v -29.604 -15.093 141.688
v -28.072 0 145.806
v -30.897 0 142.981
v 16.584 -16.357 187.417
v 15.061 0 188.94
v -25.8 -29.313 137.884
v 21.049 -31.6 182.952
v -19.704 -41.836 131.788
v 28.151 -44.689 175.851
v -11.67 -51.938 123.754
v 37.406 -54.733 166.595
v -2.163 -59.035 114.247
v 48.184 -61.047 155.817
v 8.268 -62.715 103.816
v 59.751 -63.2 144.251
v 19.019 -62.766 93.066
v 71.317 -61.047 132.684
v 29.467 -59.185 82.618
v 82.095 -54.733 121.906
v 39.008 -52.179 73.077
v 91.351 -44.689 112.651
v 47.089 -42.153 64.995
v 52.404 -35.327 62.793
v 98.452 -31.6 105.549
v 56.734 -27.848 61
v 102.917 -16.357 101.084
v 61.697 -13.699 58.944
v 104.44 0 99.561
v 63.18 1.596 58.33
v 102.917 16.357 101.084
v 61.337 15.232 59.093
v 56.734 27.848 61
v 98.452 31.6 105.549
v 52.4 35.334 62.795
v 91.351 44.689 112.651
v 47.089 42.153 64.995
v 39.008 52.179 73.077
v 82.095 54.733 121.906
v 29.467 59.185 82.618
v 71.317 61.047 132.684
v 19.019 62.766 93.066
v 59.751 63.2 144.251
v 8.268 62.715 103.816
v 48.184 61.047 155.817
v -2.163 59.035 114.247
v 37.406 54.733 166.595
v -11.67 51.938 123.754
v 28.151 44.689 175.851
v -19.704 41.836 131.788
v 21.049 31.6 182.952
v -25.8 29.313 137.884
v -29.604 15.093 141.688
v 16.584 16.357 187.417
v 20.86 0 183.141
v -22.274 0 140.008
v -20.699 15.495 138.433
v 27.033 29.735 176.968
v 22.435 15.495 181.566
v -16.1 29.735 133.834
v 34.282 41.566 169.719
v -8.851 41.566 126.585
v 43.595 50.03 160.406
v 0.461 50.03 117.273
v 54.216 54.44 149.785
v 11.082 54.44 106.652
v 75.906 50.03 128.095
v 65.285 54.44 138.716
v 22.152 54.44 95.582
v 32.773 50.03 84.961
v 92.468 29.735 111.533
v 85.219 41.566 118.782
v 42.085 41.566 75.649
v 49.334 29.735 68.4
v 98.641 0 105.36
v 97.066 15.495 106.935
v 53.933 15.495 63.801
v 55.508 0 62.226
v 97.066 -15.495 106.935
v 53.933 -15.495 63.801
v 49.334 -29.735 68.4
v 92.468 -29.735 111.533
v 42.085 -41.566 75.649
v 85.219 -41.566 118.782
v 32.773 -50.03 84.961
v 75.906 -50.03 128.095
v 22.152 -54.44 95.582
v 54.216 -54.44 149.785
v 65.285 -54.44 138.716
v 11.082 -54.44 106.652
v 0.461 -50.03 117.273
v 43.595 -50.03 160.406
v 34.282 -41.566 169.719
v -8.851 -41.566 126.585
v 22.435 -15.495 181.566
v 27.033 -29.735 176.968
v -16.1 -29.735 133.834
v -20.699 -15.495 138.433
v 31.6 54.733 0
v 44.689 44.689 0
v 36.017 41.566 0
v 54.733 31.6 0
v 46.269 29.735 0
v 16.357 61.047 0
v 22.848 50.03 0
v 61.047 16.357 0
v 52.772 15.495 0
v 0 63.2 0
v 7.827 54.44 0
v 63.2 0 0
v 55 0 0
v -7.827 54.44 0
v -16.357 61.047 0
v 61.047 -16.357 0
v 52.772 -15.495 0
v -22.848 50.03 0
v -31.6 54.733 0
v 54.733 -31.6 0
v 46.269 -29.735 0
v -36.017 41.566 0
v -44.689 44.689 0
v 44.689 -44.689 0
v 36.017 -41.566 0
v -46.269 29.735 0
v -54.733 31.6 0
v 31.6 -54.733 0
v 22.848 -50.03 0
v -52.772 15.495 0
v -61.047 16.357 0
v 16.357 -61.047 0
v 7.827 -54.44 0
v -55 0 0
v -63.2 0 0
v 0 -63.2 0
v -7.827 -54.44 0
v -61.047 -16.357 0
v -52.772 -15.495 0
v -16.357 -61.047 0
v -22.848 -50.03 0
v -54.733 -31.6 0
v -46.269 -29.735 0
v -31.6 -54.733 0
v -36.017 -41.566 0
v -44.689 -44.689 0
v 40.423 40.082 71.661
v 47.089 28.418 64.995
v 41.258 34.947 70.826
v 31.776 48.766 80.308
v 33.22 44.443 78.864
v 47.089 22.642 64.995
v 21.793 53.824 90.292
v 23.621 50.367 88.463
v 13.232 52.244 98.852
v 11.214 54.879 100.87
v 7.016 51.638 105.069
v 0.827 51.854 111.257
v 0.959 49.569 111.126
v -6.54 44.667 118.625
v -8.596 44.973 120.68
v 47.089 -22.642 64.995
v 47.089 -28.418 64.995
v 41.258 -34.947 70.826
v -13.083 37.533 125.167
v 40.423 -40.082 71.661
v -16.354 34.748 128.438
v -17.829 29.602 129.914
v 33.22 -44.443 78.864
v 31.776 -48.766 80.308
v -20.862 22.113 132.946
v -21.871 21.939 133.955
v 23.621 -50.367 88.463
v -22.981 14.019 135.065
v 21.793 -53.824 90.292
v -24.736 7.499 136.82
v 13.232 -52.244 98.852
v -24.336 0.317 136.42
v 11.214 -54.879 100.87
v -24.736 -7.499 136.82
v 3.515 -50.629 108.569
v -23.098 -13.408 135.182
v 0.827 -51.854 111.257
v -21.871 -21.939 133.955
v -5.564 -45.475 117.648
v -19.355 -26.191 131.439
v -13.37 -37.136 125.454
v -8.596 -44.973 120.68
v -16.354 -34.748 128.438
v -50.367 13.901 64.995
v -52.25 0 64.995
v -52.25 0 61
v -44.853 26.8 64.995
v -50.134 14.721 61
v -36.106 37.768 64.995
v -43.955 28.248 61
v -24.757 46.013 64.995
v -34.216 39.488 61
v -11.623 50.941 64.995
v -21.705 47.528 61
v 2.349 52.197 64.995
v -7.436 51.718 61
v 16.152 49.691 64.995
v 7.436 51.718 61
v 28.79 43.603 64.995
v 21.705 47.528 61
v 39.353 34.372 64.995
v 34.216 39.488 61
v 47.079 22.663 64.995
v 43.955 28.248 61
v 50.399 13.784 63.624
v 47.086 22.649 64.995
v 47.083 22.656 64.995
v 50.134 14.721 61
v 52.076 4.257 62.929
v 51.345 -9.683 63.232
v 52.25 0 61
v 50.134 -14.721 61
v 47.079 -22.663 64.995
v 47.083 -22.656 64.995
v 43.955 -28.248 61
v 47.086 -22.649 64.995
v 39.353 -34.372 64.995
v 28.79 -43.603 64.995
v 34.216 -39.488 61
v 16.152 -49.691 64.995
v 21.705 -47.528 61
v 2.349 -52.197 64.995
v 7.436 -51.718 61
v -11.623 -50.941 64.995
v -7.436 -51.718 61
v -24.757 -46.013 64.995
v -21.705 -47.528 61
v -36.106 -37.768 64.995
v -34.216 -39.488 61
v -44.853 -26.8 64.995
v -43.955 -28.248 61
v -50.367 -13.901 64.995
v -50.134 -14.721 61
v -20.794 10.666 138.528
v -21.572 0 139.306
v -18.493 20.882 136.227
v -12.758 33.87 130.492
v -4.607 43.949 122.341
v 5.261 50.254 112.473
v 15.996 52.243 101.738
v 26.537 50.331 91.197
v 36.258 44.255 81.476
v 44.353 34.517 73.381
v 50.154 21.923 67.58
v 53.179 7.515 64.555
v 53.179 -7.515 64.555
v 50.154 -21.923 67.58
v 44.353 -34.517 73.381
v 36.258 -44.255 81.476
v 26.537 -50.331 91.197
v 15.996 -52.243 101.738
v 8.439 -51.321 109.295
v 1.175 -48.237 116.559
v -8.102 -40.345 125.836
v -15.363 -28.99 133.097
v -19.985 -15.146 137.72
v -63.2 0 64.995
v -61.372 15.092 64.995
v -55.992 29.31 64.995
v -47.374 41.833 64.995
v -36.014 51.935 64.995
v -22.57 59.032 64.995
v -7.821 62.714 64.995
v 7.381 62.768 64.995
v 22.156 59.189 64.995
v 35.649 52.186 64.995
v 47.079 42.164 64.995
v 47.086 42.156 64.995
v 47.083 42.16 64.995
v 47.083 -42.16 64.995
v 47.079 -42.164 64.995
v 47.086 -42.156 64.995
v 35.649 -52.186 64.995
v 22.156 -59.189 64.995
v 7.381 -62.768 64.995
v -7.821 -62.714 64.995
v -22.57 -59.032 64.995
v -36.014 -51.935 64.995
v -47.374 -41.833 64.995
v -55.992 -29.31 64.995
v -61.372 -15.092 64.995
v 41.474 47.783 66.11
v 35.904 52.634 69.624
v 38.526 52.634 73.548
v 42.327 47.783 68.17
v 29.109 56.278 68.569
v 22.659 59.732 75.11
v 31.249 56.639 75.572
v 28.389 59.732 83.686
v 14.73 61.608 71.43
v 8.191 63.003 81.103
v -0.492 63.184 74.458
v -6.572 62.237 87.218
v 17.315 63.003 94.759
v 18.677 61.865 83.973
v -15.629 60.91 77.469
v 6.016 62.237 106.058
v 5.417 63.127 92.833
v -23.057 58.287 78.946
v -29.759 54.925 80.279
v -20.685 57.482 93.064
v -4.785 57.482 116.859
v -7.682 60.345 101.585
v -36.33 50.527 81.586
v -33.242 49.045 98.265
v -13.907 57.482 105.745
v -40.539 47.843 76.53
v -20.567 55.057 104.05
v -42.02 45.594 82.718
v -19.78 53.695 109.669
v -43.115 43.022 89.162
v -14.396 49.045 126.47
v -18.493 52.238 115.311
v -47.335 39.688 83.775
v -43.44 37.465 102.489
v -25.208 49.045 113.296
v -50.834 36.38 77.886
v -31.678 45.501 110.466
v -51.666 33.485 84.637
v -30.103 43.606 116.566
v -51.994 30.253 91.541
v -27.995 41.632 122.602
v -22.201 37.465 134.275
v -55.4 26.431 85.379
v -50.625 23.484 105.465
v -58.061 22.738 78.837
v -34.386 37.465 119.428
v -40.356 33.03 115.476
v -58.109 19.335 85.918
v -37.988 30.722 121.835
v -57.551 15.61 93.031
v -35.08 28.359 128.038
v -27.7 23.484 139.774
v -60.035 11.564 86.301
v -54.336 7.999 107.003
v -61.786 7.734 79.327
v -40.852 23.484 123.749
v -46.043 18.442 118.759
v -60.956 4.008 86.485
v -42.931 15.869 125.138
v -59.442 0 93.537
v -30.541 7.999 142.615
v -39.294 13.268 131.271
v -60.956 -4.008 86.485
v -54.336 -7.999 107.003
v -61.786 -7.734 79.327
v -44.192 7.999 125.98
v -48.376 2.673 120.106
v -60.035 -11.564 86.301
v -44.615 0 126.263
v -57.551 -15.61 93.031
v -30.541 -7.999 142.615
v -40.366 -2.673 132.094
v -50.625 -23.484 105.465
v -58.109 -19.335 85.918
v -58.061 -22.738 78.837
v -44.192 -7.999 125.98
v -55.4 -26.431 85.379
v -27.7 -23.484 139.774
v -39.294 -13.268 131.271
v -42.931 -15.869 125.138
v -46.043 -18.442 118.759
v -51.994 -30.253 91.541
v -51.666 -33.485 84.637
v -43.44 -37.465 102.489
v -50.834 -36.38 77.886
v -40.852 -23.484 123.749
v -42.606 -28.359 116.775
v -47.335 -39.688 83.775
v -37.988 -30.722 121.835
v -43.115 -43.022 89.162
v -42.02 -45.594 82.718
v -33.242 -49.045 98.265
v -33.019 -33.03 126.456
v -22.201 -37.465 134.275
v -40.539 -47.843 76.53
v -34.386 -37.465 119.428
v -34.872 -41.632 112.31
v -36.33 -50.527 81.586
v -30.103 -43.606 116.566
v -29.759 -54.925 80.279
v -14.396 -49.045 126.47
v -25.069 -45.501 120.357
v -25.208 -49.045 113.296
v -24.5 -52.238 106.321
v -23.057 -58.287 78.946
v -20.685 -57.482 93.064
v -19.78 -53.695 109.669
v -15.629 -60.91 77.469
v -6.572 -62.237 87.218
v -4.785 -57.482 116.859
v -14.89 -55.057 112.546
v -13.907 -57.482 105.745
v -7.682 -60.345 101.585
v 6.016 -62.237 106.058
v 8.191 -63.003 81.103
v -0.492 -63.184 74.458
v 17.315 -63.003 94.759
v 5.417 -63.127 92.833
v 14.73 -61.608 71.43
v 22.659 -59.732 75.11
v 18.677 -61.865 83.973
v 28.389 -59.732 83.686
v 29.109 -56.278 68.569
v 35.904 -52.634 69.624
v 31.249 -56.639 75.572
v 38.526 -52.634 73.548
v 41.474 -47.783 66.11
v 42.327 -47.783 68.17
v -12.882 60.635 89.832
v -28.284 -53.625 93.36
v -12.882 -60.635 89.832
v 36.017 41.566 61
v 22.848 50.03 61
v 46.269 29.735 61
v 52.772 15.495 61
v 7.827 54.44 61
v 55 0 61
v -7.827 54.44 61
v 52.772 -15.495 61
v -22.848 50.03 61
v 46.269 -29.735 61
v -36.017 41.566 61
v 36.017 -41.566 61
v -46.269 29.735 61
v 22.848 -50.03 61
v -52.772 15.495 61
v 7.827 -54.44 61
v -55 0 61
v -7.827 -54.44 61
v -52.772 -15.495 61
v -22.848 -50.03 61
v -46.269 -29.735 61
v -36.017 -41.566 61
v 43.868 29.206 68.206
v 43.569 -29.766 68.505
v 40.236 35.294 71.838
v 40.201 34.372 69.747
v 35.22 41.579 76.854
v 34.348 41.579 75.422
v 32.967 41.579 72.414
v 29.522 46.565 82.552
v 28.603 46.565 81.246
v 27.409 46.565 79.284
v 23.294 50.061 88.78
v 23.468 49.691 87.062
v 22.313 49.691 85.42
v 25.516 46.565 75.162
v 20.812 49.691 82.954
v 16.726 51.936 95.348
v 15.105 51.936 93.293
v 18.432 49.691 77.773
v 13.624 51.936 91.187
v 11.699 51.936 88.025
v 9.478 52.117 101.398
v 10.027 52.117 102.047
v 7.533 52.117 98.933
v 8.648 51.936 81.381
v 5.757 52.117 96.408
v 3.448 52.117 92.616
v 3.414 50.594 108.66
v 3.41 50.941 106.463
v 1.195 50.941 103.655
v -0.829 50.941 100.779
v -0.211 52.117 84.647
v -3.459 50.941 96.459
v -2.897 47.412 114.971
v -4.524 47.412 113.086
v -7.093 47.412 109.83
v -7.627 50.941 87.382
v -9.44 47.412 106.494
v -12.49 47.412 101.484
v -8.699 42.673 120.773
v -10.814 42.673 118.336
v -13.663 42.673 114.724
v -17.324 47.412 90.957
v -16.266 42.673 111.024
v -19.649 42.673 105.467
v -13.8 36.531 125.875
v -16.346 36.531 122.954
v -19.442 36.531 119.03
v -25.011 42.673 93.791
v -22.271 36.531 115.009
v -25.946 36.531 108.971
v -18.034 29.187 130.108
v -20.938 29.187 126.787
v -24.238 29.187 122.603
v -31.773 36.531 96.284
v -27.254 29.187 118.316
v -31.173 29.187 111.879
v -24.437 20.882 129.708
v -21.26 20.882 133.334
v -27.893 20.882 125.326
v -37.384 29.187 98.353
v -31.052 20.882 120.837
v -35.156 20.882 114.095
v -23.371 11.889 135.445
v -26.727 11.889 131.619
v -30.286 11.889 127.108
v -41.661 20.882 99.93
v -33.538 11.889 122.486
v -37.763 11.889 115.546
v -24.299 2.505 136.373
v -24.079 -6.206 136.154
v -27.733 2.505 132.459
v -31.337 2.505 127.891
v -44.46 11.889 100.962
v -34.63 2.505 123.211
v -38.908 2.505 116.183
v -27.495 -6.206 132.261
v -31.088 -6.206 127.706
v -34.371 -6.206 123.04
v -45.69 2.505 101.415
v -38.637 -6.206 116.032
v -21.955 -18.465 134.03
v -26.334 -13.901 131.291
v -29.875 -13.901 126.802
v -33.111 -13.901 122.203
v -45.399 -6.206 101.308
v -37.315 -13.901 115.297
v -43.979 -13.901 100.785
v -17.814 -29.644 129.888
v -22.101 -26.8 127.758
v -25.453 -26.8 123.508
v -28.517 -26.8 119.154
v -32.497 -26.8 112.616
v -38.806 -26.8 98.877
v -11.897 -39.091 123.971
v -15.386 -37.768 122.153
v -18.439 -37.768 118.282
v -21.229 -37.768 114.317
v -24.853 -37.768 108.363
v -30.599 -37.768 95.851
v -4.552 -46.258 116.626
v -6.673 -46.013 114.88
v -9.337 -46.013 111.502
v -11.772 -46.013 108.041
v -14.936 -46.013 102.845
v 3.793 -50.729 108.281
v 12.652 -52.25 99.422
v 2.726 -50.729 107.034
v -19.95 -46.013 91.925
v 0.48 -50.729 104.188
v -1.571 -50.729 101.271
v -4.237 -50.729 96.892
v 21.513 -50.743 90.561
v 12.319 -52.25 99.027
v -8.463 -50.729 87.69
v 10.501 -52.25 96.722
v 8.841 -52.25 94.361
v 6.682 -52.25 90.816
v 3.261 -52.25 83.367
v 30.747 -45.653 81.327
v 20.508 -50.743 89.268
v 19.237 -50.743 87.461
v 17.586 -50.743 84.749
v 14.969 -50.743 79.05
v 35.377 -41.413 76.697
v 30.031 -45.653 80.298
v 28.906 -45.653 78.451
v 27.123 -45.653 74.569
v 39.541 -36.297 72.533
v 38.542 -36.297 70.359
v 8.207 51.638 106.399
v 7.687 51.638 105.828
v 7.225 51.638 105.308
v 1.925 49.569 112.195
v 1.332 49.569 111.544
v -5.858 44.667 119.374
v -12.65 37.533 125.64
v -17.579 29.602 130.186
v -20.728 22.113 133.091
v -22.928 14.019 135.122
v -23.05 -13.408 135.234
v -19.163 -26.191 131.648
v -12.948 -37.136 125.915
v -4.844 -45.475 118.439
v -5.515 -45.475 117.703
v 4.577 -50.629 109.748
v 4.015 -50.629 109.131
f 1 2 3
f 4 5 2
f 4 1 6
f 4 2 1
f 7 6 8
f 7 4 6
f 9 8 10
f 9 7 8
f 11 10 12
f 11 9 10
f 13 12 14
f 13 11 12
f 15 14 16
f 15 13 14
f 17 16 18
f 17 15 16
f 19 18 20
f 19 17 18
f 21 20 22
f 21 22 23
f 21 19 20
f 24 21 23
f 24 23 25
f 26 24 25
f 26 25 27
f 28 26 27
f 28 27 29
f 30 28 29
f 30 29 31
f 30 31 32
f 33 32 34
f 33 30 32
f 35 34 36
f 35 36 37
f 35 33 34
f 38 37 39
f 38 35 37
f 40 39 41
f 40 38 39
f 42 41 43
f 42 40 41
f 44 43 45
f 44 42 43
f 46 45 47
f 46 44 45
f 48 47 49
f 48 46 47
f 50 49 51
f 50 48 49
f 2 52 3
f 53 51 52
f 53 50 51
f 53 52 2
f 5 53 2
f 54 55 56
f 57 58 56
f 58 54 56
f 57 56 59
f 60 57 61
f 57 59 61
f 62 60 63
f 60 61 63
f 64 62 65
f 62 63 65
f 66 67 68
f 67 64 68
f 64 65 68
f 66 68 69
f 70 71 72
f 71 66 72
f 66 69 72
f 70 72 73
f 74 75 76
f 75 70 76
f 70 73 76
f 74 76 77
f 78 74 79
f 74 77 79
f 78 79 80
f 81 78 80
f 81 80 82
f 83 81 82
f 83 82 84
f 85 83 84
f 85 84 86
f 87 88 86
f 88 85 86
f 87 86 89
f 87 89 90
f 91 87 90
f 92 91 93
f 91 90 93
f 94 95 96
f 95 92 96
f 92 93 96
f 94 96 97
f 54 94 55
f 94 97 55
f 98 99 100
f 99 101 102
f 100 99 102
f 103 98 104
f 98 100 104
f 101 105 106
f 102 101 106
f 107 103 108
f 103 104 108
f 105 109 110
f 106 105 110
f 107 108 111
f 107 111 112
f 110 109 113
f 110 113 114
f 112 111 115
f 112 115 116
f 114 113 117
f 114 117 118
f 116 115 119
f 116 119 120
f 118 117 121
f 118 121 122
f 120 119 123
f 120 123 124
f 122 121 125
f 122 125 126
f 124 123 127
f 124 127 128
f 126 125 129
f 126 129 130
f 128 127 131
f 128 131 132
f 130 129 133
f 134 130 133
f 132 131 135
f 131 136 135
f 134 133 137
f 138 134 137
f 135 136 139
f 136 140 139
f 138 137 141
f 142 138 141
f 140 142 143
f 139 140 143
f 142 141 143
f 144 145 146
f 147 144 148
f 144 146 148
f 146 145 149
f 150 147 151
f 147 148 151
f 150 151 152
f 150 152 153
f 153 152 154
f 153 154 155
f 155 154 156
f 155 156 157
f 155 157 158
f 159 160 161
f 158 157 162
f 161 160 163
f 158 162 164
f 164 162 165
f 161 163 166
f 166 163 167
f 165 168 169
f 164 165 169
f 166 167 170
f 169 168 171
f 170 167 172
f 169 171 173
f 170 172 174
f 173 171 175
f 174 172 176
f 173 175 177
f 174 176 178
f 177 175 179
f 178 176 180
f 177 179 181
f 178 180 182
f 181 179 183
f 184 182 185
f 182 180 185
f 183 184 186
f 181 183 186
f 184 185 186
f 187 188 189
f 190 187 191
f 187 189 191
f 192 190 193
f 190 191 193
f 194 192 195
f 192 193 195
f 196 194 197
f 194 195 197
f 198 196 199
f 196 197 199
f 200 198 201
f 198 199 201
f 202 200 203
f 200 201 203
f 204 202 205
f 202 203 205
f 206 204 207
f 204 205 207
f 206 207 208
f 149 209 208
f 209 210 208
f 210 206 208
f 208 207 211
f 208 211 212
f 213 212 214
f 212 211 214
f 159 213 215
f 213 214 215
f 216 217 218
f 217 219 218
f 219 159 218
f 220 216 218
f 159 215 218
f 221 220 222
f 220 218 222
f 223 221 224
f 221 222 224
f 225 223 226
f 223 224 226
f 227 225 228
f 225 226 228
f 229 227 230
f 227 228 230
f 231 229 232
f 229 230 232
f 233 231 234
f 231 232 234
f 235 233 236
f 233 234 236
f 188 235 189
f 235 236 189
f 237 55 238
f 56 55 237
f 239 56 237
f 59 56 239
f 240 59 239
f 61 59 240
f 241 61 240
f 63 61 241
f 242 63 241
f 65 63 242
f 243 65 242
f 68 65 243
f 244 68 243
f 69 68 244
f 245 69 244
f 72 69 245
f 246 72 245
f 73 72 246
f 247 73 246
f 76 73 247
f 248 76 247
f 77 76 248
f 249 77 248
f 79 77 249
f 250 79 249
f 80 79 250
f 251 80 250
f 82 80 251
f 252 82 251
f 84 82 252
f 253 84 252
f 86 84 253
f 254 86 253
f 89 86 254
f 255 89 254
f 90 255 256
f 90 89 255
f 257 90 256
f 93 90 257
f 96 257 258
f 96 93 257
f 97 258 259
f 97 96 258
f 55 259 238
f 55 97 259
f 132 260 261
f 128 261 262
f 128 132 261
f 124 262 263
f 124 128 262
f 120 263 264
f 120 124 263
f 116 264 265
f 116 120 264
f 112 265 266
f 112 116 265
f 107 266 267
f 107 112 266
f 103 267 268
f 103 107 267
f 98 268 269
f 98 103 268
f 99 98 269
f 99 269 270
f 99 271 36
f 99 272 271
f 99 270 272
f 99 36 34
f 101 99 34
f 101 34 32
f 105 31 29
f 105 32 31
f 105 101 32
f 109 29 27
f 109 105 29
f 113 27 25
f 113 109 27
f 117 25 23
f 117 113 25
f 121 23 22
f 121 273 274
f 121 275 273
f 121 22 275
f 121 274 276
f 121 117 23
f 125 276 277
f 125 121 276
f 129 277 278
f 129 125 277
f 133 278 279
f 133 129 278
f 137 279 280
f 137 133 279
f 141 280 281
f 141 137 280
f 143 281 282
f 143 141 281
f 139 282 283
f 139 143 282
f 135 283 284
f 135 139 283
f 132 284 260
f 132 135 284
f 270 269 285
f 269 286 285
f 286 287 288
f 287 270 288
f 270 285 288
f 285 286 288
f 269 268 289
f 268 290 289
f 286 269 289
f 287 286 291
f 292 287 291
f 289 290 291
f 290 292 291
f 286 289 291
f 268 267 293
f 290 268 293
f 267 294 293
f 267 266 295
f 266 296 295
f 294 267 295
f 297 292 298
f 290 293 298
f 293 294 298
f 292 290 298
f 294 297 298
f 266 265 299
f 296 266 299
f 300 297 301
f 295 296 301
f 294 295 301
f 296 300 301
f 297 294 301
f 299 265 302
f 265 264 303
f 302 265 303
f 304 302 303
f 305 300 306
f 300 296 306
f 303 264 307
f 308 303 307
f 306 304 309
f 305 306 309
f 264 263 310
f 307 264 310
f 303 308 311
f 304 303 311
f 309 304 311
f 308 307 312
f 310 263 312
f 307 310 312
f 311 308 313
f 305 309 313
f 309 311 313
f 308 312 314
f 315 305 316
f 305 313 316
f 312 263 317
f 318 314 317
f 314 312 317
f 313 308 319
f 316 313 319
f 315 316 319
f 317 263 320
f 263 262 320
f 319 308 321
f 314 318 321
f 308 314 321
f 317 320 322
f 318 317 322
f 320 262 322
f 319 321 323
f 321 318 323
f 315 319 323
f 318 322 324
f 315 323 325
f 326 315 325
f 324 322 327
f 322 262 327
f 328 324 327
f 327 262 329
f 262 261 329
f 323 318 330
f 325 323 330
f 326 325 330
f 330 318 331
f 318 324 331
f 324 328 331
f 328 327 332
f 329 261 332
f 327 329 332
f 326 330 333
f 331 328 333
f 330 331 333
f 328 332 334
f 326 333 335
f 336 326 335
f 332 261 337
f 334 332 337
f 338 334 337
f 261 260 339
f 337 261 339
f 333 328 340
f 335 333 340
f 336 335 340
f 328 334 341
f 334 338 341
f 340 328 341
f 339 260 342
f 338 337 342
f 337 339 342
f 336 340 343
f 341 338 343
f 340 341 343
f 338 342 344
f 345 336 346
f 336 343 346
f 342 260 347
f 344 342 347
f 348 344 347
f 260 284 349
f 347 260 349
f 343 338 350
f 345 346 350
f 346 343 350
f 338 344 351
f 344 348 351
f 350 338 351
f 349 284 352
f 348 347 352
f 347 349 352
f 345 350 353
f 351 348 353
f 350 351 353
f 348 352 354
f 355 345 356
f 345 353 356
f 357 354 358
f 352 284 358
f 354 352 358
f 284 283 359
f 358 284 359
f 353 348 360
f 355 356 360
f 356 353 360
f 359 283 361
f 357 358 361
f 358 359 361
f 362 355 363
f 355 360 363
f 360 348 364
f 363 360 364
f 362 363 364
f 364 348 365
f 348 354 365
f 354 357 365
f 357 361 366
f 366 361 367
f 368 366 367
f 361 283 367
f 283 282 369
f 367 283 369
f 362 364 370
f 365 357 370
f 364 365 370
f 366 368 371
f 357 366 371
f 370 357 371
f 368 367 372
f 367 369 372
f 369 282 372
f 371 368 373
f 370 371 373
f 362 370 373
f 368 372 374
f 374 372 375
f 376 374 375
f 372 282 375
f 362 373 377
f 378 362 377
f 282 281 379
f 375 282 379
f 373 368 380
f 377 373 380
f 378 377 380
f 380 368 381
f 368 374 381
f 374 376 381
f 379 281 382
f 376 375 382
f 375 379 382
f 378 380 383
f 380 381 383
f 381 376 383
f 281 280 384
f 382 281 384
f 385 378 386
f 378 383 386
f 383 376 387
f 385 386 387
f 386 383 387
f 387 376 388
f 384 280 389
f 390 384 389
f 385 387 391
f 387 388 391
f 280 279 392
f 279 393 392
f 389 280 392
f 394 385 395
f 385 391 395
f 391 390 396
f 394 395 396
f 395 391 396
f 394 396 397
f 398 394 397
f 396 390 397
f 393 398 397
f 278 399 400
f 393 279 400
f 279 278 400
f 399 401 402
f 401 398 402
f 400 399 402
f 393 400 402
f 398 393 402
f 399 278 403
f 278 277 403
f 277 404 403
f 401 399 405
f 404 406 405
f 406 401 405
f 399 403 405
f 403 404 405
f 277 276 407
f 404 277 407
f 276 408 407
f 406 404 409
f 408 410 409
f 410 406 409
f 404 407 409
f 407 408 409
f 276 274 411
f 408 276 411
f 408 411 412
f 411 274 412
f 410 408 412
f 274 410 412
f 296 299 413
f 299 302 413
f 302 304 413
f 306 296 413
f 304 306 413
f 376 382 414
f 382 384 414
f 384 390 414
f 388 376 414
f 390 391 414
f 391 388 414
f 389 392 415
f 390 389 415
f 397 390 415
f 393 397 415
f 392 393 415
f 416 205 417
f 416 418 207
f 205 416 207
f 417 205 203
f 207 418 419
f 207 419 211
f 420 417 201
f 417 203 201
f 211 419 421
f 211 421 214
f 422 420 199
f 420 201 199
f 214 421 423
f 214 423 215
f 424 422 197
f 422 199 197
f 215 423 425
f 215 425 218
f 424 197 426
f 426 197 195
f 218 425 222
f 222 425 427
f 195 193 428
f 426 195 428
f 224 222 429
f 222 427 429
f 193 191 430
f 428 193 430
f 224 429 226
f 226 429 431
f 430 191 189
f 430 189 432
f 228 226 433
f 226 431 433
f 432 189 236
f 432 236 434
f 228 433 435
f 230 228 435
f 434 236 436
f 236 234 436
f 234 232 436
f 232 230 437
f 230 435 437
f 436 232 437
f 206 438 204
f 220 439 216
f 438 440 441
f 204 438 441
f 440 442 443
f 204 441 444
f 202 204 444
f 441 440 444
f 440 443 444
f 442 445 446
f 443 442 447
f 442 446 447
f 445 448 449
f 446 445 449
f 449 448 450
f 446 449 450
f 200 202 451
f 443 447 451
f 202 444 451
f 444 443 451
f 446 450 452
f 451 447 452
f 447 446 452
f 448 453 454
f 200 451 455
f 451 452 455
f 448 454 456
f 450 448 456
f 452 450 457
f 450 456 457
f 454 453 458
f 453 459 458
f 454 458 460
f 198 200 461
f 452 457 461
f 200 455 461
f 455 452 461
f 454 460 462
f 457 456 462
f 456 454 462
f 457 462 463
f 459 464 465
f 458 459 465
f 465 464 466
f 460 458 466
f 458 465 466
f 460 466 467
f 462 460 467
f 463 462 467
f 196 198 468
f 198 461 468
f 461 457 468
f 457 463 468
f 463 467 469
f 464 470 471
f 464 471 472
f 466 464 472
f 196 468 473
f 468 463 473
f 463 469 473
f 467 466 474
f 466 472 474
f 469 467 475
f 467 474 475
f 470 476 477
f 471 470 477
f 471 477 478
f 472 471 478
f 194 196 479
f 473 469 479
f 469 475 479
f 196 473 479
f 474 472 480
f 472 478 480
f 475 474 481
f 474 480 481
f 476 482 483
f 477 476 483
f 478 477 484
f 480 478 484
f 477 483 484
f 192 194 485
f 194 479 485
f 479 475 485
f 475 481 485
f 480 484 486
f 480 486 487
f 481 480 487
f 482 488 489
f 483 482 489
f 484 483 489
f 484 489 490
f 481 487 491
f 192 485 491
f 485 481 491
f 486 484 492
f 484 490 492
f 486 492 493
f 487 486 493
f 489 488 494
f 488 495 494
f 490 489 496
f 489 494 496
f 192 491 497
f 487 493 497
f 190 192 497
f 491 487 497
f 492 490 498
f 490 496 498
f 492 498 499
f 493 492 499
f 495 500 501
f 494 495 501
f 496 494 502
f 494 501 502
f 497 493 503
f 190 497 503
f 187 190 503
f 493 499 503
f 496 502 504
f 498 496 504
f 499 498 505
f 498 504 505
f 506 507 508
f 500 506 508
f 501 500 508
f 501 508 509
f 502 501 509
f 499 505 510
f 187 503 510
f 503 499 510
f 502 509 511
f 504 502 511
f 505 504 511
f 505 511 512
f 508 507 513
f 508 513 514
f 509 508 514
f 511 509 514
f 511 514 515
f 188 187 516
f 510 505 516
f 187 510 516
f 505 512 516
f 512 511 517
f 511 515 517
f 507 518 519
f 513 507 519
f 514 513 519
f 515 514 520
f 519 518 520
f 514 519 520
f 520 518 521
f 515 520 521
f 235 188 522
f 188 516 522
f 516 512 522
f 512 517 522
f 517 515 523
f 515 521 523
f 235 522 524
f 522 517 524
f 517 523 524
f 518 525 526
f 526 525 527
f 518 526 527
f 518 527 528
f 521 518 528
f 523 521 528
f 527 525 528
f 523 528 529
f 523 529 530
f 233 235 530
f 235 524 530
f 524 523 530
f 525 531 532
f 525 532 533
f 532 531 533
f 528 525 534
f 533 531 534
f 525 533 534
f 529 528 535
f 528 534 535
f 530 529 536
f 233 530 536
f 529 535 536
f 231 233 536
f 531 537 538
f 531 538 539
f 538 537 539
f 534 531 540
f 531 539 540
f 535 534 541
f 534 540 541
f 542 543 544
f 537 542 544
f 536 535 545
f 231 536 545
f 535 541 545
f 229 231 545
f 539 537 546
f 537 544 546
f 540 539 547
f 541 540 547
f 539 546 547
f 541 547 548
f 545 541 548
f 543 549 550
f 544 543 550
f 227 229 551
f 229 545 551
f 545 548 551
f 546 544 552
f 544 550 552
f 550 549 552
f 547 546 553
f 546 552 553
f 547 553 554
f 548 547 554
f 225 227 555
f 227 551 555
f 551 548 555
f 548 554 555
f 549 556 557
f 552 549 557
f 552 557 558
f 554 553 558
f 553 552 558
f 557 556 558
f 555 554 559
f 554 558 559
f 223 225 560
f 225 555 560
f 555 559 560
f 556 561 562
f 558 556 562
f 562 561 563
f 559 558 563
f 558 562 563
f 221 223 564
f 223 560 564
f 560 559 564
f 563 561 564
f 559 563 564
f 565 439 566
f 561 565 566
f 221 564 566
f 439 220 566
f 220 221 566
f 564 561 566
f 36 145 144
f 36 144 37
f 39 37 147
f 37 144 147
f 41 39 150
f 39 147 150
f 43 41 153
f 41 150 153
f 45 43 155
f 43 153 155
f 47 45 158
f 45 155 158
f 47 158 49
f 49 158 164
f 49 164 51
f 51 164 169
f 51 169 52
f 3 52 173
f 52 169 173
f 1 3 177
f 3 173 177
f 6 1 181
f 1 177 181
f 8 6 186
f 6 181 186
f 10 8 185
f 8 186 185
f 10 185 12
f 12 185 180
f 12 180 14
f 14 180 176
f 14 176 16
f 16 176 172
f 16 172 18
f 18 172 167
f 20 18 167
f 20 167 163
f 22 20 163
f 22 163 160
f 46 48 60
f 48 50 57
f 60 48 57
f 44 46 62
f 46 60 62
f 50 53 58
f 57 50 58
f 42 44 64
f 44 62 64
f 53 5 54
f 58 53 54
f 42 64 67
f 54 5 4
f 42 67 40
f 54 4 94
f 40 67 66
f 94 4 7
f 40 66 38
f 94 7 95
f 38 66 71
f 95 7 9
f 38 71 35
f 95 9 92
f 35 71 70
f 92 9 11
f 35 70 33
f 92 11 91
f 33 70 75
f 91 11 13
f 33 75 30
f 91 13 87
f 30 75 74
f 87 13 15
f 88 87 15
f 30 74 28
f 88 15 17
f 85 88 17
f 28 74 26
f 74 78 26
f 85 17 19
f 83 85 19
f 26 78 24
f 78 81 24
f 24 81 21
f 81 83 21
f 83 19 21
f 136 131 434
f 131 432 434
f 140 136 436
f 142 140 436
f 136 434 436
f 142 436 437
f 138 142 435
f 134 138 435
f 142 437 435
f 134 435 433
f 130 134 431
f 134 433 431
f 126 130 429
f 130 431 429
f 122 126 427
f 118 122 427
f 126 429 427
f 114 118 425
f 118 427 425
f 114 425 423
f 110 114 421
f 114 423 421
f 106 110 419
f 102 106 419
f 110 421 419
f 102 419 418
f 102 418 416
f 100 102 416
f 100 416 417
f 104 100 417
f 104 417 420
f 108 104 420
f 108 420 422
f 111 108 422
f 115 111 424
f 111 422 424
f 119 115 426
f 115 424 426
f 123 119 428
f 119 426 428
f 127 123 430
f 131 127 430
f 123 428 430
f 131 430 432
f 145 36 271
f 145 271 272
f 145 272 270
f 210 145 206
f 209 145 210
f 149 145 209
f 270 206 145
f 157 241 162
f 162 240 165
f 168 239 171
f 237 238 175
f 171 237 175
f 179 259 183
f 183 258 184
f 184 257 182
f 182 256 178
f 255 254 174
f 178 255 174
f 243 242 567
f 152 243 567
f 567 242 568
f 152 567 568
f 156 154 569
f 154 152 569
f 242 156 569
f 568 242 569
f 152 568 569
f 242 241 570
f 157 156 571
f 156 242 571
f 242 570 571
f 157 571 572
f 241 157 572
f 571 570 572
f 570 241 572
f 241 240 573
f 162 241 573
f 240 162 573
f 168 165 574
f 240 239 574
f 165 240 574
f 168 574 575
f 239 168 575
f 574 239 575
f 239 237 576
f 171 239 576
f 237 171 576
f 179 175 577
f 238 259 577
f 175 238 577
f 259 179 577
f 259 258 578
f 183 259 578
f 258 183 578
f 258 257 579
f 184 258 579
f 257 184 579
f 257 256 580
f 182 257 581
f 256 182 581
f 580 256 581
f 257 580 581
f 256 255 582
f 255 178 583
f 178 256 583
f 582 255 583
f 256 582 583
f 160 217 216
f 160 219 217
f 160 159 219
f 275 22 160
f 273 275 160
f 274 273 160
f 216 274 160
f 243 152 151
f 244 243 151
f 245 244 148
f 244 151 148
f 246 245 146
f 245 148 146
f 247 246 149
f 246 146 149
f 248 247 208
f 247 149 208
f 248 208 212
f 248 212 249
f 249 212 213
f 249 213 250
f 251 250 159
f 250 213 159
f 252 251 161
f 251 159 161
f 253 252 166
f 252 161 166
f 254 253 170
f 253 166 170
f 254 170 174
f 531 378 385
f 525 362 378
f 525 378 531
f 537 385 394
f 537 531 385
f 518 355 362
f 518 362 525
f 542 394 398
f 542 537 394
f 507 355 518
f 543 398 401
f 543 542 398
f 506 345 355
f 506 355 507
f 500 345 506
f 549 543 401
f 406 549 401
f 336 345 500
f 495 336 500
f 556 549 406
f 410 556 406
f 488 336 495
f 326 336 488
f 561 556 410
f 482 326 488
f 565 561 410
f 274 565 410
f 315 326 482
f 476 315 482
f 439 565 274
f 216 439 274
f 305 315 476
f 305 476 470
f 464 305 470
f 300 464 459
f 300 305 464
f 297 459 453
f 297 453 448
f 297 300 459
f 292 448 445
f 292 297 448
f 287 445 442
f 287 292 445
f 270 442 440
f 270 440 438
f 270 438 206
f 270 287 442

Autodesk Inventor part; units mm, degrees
ref_plane "YZ Plane" through (0, 0, 0) normal (1, 0, 0) x (0, 1, 0)
ref_plane "XZ Plane" through (0, 0, 0) normal (0, 1, 0) x (-1, 0, 0)
ref_plane "XY Plane" through (0, 0, 0) normal (0, 0, 1) x (1, 0, 0)
sketch "Sketch1" plane through (0, 0, 0) normal (0, 1, 0) x (-1, 0, 0)
  line L0 (0, 0) -> (0, 84.5) construction
  line L1 (0, 84.5) -> (-59.750523, 144.250523) construction
  line L2 (63.2, 0) -> (55, 0)
  line L3 (55, 0) -> (55, 61)
  line L4 (55, 61) -> (63.2, 61)
  line L5 (63.2, 61) -> (63.2, 0)
  line L6 (0, 0) -> (55, 0) construction
  line L7 (55, 61) -> (0, 61) construction
  line L8 (-20.85965, 183.141396) -> (22.273864, 140.007882)
  line L9 (22.273864, 140.007882) -> (28.072139, 145.806158)
  line L10 (28.072139, 145.806158) -> (-15.061374, 188.939672)
  line L11 (-15.061374, 188.939672) -> (-20.85965, 183.141396)
  line L12 (22.273864, 140.007882) -> (-16.617009, 101.117009) construction
  line L13 (-20.85965, 183.141396) -> (-59.750523, 144.250523) construction
  arc A0 (0, 61) -> (-16.617009, 101.117009) centre (-56.734019, 61) ccw
  line L14 (28.072139, 145.806158) -> (30.897031, 142.981266)
  line L15 (30.897031, 142.981266) -> (25.098755, 137.182991)
  line L16 (25.098755, 137.182991) -> (22.273864, 140.007882)
  line L17 (55, 61) -> (55, 64.995) construction
  line L18 (55, 64.995) -> (63.2, 64.995)
  line L19 (63.2, 64.995) -> (63.2, 61)
  line L20 (-15.061374, 188.939672) -> (-59.750523, 144.250523)
  line L21 (-15.061374, 188.939672) -> (30.897031, 142.981266)
  line L22 (30.897031, 142.981266) -> (-13.792118, 98.292118)
  line L23 (-13.792118, 98.292118) -> (-59.750523, 144.250523)
  line L24 (63.2, 64.995) -> (0, 64.995)
  line L25 (0, 64.995) -> (0, 0)
  line L26 (63.2, 0) -> (63.2, 64.995)
  line L27 (0, 0) -> (63.2, 0)
  line L28 (55, 61) -> (0, 61)
  line L29 (52.25, 64.995) -> (52.25, 61)
  line L30 (20.32932, 138.063339) -> (23.154212, 135.238447)
  line L31 (20.32932, 138.063339) -> (22.273864, 140.007882)
  dimension "d0" = 61
  dimension "d1" = 23.5
  dimension "d2" = 110
  dimension "d3" = 8.2
  dimension "d4" = 8.2
  dimension "d5" = 110
  dimension "d6" = 135
  dimension "d7" = 61
  dimension "d8" = 23.5
  dimension "d9" = 3.995
  dimension "d10" = 3.995
  dimension "d11" = 104.5
  dimension "d12" = 104.5
revolve "Revolution1" add sketch "Sketch1" angle 360 about axis through (0, 0, 84.5) along (0.7071068, 0, 0.7071068) contours L11 L10 L9 L8 | L8 L31 L30 L22 L23 L20 | L9 L14 L15 L16 | L16 L22 L30 L31
revolve "Revolution2" add sketch "Sketch1" angle 360 about axis through (0, 0, 0) along (0, 0, 1) contours L2 L3 L4 L5 | L27 L25 L28 L3 | L4 L28 L29 L24 L18 L19 | L28 L25 L24 L29
revolve "Revolution3" cut sketch "Sketch1" angle 360 about axis through (0, 0, 0) along (0, 0, 1) contours L27 L25 L28 L3 | L28 L25 L24 L29
revolve "Revolution4" cut sketch "Sketch1" angle 360 about axis through (0, 0, 84.5) along (0.7071068, 0, 0.7071068) contours L8 L31 L30 L22 L23 L20
sketch "Sketch2" plane through (0, 0, 64.995) normal (0, 0, 1) x (1, 0, 0)
  line L0 (47.089236, 42.152626) -> (47.089236, -42.152626)
  arc A0 (47.089236, 42.152626) -> (47.089236, -42.152626) centre (0, 0) ccw
  circle A1 centre (0, 0) radius 63.2
  circle A2 centre (0, 0) radius 52.25
  line L1 (47.079236, -42.163795) -> (47.079236, 42.163795)
  dimension "d13" = 104.5
  dimension "d14" = 126.4
  dimension "d15" = 0.01
revolve "Revolution5" add sketch "Sketch2" angle 45 about axis through (47.079236, -42.163795, 64.995) along (0, 1, 0) contours L1 A2 A0 | L1 A2
sketch "Sketch3" plane through (0, 0, 64.995) normal (0, 0, 1) x (1, 0, 0)
  circle A0 centre (0, 0) radius 52.25
  line L0 (47.089236, 42.152626) -> (47.089236, -42.152626)
  arc A1 (47.089236, 42.152626) -> (47.089236, -42.152626) centre (0, 0) ccw
  line L1 (53.089236, 110) -> (53.089236, -110)
  line L2 (-63.2, 0) -> (0, 0) construction
  point P0 (53.089236, 0)
  dimension "d17" = 6
  dimension "d18" = 220
revolve "Revolution6" cut sketch "Sketch3" angle 45 about axis through (53.089236, 110, 64.995) along (0, 1, 0) contours A0 L0 | L0 A0
equation "\"d0\" = t1"
equation "\"d1\" = z1"
equation "\"d2\" = dd1"
equation "\"d3\" = s1"
equation "\"d4\" = s1"
equation "\"d5\" = dd1"
equation "\"d7\" = t1"
equation "\"d8\" = z1"
equation "\"z1\" = 23.5"
equation "\"t1\" = 61"
equation "\"s1\" = 8.2"
equation "\"dd1\" = 110"
equation "\"X\" = 0.01"
equation "\"Y\" = 6"
properties part number "DIN 8063 Изгиб 45 градусов, тип W2 110" material "ПВХ, непластифицированный"
